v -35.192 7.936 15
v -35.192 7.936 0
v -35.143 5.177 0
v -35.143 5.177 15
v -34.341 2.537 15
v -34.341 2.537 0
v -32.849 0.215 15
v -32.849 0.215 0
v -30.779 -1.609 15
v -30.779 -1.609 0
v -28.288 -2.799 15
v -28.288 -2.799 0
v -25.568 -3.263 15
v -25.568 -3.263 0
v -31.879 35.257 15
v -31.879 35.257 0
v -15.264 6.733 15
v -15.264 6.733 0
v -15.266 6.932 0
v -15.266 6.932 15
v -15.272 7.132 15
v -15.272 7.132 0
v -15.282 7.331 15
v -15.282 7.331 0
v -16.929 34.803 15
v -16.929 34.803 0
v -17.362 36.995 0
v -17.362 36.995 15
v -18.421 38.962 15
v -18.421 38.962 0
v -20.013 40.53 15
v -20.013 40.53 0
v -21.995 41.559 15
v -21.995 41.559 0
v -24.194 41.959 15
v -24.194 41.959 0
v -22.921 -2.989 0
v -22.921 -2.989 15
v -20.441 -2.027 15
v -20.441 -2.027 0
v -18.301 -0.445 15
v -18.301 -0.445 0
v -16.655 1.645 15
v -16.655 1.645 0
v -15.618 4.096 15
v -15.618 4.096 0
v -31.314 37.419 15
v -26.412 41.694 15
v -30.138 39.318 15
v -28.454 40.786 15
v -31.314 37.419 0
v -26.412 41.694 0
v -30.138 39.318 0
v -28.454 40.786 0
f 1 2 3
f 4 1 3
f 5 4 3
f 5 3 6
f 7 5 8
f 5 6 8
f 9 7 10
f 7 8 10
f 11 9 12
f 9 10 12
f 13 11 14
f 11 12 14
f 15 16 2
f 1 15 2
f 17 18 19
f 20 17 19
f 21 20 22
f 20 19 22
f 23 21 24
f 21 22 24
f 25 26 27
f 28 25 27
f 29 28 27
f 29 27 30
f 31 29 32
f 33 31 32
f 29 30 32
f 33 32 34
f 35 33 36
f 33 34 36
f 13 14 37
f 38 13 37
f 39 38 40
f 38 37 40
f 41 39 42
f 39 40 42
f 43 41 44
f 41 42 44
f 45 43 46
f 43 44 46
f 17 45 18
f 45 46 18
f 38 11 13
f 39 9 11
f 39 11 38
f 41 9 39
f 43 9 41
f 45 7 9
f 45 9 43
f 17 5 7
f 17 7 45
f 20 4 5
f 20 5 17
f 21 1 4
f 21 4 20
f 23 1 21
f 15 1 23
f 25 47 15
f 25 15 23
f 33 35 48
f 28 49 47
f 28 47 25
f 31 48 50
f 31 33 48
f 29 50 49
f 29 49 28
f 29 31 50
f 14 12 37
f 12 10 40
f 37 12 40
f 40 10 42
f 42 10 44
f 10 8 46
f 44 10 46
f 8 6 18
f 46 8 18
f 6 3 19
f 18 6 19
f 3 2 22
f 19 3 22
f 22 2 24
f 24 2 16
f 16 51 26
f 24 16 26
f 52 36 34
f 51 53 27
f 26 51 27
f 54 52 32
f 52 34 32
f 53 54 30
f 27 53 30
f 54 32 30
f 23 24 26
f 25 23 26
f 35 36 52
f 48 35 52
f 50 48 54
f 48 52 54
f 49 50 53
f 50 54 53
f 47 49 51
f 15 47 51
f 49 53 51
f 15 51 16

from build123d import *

# Parameters (mm, degrees)
F1_DEPTH = 15


with BuildPart() as f1:
    # F0 (on Top) → F1 (new body)
    with BuildSketch(Plane.XY):
        with BuildLine():
            ThreePointArc((-24.649322, 26.966004), (-19.199356, 29.079291), (-16.921483, 34.462543))
            ThreePointArc((-16.921483, 34.462543), (-16.923414, 34.632717), (-16.929205, 34.802804))
            ThreePointArc((-16.929205, 34.802804), (-19.158107, 39.80547), (-24.193644, 41.959081))
            Line((-24.193644, 41.959081), (-24.421483, 34.462543))
            Line((-24.421483, 34.462543), (-24.649322, 26.966004))
        make_face()
        with BuildLine():
            ThreePointArc((-16.929205, 34.802804), (-16.923414, 34.632717), (-16.921483, 34.462543))
            ThreePointArc((-16.921483, 34.462543), (-19.199356, 29.079291), (-24.649322, 26.966004))
            Line((-24.649322, 26.966004), (-24.960474, 16.728221))
            ThreePointArc((-24.960474, 16.728221), (-18.298251, 13.907425), (-15.282183, 7.3313))
            Line((-15.282183, 7.3313), (-16.929205, 34.802804))
        make_face()
        with BuildLine():
            Line((-24.960474, 16.728221), (-24.649322, 26.966004))
            ThreePointArc((-24.649322, 26.966004), (-30.074188, 29.533352), (-31.879268, 35.257174))
            Line((-31.879268, 35.257174), (-35.191567, 7.936397))
            ThreePointArc((-35.191567, 7.936397), (-31.781704, 14.317222), (-24.960474, 16.728221))
        make_face()
        with BuildLine():
            ThreePointArc((-31.879268, 35.257174), (-30.074188, 29.533352), (-24.649322, 26.966004))
            Line((-24.649322, 26.966004), (-24.421483, 34.462543))
            Line((-24.421483, 34.462543), (-24.193644, 41.959081))
            ThreePointArc((-24.193644, 41.959081), (-29.350673, 40.115248), (-31.879268, 35.257174))
        make_face()
        with BuildLine():
            ThreePointArc((-15.264259, 6.732836), (-15.268741, 7.032202), (-15.282183, 7.3313))
            ThreePointArc((-15.282183, 7.3313), (-18.298251, 13.907425), (-24.960474, 16.728221))
            Line((-24.960474, 16.728221), (-25.264259, 6.732836))
            Line((-25.264259, 6.732836), (-25.568044, -3.262549))
            ThreePointArc((-25.568044, -3.262549), (-18.301424, -0.444833), (-15.264259, 6.732836))
        make_face()
        with BuildLine():
            Line((-25.264259, 6.732836), (-24.960474, 16.728221))
            ThreePointArc((-24.960474, 16.728221), (-31.781704, 14.317222), (-35.191567, 7.936397))
            ThreePointArc((-35.191567, 7.936397), (-32.848645, 0.215391), (-25.568044, -3.262549))
            Line((-25.568044, -3.262549), (-25.264259, 6.732836))
        make_face()
    extrude(amount=F1_DEPTH)


solid = f1.part
